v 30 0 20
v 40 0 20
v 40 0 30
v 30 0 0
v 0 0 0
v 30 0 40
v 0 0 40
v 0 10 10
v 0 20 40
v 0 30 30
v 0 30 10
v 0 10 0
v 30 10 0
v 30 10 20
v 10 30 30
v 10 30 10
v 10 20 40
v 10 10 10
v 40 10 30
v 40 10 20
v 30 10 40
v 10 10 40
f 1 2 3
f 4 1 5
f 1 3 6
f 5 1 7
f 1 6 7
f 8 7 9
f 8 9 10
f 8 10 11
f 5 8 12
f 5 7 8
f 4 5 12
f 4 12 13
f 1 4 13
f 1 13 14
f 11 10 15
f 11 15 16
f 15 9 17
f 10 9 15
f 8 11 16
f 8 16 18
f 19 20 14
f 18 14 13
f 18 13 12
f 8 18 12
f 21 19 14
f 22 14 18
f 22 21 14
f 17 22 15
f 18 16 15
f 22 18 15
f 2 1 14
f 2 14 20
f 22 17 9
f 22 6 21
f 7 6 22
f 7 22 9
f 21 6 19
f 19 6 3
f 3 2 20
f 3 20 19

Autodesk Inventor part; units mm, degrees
ref_plane "YZ Plane" through (0, 0, 0) normal (1, 0, 0) x (0, 1, 0)
ref_plane "XZ Plane" through (0, 0, 0) normal (0, 1, 0) x (-1, 0, 0)
ref_plane "XY Plane" through (0, 0, 0) normal (0, 0, 1) x (1, 0, 0)
sketch "草圖1" plane through (0, 0, 0) normal (0, 1, 0) x (-1, 0, 0)
  line L0 (0, 0) -> (-40, 0)
  line L1 (-40, 0) -> (-40, 40)
  line L2 (-40, 40) -> (0, 40)
  line L3 (0, 40) -> (0, 0)
  line L4 (-30, 0) -> (-30, 20)
  line L5 (-30, 20) -> (-40, 20)
  line L6 (-30, 40) -> (-40, 30)
  dimension "d0" = 40
  dimension "d1" = 40
  dimension "d2" = 10
  dimension "d3" = 20
  dimension "d4" = 10
  dimension "d5" = 10
extrude "擠出1" add sketch "草圖1" along normal blind 10 contours L0 L4 L5 L1 L6 L2 L3
sketch "草圖2" plane through (0, 0, 0) normal (-1, 0, 0) x (0, 0, 1)
  line L0 (40, 10) -> (40, 0) projected
  line L1 (40, 0) -> (0, 0) projected
  line L2 (0, 0) -> (0, 10) projected
  line L3 (0, 10) -> (40, 10) projected
  line L4 (40, 10) -> (40, 20)
  line L5 (40, 20) -> (30, 30)
  line L6 (30, 30) -> (10, 30)
  line L7 (10, 30) -> (10, 10)
  line L8 (10, 10) -> (40, 10)
  dimension "d8" = 30
  dimension "d9" = 10
  dimension "d10" = 10
  dimension "d11" = 30
extrude "擠出2" add sketch "草圖2" against normal blind 10 contours L3 L7 L6 L5 L4
equation "\"d10\" = d9"
properties part number "10" material "鋼、碳鋼"
